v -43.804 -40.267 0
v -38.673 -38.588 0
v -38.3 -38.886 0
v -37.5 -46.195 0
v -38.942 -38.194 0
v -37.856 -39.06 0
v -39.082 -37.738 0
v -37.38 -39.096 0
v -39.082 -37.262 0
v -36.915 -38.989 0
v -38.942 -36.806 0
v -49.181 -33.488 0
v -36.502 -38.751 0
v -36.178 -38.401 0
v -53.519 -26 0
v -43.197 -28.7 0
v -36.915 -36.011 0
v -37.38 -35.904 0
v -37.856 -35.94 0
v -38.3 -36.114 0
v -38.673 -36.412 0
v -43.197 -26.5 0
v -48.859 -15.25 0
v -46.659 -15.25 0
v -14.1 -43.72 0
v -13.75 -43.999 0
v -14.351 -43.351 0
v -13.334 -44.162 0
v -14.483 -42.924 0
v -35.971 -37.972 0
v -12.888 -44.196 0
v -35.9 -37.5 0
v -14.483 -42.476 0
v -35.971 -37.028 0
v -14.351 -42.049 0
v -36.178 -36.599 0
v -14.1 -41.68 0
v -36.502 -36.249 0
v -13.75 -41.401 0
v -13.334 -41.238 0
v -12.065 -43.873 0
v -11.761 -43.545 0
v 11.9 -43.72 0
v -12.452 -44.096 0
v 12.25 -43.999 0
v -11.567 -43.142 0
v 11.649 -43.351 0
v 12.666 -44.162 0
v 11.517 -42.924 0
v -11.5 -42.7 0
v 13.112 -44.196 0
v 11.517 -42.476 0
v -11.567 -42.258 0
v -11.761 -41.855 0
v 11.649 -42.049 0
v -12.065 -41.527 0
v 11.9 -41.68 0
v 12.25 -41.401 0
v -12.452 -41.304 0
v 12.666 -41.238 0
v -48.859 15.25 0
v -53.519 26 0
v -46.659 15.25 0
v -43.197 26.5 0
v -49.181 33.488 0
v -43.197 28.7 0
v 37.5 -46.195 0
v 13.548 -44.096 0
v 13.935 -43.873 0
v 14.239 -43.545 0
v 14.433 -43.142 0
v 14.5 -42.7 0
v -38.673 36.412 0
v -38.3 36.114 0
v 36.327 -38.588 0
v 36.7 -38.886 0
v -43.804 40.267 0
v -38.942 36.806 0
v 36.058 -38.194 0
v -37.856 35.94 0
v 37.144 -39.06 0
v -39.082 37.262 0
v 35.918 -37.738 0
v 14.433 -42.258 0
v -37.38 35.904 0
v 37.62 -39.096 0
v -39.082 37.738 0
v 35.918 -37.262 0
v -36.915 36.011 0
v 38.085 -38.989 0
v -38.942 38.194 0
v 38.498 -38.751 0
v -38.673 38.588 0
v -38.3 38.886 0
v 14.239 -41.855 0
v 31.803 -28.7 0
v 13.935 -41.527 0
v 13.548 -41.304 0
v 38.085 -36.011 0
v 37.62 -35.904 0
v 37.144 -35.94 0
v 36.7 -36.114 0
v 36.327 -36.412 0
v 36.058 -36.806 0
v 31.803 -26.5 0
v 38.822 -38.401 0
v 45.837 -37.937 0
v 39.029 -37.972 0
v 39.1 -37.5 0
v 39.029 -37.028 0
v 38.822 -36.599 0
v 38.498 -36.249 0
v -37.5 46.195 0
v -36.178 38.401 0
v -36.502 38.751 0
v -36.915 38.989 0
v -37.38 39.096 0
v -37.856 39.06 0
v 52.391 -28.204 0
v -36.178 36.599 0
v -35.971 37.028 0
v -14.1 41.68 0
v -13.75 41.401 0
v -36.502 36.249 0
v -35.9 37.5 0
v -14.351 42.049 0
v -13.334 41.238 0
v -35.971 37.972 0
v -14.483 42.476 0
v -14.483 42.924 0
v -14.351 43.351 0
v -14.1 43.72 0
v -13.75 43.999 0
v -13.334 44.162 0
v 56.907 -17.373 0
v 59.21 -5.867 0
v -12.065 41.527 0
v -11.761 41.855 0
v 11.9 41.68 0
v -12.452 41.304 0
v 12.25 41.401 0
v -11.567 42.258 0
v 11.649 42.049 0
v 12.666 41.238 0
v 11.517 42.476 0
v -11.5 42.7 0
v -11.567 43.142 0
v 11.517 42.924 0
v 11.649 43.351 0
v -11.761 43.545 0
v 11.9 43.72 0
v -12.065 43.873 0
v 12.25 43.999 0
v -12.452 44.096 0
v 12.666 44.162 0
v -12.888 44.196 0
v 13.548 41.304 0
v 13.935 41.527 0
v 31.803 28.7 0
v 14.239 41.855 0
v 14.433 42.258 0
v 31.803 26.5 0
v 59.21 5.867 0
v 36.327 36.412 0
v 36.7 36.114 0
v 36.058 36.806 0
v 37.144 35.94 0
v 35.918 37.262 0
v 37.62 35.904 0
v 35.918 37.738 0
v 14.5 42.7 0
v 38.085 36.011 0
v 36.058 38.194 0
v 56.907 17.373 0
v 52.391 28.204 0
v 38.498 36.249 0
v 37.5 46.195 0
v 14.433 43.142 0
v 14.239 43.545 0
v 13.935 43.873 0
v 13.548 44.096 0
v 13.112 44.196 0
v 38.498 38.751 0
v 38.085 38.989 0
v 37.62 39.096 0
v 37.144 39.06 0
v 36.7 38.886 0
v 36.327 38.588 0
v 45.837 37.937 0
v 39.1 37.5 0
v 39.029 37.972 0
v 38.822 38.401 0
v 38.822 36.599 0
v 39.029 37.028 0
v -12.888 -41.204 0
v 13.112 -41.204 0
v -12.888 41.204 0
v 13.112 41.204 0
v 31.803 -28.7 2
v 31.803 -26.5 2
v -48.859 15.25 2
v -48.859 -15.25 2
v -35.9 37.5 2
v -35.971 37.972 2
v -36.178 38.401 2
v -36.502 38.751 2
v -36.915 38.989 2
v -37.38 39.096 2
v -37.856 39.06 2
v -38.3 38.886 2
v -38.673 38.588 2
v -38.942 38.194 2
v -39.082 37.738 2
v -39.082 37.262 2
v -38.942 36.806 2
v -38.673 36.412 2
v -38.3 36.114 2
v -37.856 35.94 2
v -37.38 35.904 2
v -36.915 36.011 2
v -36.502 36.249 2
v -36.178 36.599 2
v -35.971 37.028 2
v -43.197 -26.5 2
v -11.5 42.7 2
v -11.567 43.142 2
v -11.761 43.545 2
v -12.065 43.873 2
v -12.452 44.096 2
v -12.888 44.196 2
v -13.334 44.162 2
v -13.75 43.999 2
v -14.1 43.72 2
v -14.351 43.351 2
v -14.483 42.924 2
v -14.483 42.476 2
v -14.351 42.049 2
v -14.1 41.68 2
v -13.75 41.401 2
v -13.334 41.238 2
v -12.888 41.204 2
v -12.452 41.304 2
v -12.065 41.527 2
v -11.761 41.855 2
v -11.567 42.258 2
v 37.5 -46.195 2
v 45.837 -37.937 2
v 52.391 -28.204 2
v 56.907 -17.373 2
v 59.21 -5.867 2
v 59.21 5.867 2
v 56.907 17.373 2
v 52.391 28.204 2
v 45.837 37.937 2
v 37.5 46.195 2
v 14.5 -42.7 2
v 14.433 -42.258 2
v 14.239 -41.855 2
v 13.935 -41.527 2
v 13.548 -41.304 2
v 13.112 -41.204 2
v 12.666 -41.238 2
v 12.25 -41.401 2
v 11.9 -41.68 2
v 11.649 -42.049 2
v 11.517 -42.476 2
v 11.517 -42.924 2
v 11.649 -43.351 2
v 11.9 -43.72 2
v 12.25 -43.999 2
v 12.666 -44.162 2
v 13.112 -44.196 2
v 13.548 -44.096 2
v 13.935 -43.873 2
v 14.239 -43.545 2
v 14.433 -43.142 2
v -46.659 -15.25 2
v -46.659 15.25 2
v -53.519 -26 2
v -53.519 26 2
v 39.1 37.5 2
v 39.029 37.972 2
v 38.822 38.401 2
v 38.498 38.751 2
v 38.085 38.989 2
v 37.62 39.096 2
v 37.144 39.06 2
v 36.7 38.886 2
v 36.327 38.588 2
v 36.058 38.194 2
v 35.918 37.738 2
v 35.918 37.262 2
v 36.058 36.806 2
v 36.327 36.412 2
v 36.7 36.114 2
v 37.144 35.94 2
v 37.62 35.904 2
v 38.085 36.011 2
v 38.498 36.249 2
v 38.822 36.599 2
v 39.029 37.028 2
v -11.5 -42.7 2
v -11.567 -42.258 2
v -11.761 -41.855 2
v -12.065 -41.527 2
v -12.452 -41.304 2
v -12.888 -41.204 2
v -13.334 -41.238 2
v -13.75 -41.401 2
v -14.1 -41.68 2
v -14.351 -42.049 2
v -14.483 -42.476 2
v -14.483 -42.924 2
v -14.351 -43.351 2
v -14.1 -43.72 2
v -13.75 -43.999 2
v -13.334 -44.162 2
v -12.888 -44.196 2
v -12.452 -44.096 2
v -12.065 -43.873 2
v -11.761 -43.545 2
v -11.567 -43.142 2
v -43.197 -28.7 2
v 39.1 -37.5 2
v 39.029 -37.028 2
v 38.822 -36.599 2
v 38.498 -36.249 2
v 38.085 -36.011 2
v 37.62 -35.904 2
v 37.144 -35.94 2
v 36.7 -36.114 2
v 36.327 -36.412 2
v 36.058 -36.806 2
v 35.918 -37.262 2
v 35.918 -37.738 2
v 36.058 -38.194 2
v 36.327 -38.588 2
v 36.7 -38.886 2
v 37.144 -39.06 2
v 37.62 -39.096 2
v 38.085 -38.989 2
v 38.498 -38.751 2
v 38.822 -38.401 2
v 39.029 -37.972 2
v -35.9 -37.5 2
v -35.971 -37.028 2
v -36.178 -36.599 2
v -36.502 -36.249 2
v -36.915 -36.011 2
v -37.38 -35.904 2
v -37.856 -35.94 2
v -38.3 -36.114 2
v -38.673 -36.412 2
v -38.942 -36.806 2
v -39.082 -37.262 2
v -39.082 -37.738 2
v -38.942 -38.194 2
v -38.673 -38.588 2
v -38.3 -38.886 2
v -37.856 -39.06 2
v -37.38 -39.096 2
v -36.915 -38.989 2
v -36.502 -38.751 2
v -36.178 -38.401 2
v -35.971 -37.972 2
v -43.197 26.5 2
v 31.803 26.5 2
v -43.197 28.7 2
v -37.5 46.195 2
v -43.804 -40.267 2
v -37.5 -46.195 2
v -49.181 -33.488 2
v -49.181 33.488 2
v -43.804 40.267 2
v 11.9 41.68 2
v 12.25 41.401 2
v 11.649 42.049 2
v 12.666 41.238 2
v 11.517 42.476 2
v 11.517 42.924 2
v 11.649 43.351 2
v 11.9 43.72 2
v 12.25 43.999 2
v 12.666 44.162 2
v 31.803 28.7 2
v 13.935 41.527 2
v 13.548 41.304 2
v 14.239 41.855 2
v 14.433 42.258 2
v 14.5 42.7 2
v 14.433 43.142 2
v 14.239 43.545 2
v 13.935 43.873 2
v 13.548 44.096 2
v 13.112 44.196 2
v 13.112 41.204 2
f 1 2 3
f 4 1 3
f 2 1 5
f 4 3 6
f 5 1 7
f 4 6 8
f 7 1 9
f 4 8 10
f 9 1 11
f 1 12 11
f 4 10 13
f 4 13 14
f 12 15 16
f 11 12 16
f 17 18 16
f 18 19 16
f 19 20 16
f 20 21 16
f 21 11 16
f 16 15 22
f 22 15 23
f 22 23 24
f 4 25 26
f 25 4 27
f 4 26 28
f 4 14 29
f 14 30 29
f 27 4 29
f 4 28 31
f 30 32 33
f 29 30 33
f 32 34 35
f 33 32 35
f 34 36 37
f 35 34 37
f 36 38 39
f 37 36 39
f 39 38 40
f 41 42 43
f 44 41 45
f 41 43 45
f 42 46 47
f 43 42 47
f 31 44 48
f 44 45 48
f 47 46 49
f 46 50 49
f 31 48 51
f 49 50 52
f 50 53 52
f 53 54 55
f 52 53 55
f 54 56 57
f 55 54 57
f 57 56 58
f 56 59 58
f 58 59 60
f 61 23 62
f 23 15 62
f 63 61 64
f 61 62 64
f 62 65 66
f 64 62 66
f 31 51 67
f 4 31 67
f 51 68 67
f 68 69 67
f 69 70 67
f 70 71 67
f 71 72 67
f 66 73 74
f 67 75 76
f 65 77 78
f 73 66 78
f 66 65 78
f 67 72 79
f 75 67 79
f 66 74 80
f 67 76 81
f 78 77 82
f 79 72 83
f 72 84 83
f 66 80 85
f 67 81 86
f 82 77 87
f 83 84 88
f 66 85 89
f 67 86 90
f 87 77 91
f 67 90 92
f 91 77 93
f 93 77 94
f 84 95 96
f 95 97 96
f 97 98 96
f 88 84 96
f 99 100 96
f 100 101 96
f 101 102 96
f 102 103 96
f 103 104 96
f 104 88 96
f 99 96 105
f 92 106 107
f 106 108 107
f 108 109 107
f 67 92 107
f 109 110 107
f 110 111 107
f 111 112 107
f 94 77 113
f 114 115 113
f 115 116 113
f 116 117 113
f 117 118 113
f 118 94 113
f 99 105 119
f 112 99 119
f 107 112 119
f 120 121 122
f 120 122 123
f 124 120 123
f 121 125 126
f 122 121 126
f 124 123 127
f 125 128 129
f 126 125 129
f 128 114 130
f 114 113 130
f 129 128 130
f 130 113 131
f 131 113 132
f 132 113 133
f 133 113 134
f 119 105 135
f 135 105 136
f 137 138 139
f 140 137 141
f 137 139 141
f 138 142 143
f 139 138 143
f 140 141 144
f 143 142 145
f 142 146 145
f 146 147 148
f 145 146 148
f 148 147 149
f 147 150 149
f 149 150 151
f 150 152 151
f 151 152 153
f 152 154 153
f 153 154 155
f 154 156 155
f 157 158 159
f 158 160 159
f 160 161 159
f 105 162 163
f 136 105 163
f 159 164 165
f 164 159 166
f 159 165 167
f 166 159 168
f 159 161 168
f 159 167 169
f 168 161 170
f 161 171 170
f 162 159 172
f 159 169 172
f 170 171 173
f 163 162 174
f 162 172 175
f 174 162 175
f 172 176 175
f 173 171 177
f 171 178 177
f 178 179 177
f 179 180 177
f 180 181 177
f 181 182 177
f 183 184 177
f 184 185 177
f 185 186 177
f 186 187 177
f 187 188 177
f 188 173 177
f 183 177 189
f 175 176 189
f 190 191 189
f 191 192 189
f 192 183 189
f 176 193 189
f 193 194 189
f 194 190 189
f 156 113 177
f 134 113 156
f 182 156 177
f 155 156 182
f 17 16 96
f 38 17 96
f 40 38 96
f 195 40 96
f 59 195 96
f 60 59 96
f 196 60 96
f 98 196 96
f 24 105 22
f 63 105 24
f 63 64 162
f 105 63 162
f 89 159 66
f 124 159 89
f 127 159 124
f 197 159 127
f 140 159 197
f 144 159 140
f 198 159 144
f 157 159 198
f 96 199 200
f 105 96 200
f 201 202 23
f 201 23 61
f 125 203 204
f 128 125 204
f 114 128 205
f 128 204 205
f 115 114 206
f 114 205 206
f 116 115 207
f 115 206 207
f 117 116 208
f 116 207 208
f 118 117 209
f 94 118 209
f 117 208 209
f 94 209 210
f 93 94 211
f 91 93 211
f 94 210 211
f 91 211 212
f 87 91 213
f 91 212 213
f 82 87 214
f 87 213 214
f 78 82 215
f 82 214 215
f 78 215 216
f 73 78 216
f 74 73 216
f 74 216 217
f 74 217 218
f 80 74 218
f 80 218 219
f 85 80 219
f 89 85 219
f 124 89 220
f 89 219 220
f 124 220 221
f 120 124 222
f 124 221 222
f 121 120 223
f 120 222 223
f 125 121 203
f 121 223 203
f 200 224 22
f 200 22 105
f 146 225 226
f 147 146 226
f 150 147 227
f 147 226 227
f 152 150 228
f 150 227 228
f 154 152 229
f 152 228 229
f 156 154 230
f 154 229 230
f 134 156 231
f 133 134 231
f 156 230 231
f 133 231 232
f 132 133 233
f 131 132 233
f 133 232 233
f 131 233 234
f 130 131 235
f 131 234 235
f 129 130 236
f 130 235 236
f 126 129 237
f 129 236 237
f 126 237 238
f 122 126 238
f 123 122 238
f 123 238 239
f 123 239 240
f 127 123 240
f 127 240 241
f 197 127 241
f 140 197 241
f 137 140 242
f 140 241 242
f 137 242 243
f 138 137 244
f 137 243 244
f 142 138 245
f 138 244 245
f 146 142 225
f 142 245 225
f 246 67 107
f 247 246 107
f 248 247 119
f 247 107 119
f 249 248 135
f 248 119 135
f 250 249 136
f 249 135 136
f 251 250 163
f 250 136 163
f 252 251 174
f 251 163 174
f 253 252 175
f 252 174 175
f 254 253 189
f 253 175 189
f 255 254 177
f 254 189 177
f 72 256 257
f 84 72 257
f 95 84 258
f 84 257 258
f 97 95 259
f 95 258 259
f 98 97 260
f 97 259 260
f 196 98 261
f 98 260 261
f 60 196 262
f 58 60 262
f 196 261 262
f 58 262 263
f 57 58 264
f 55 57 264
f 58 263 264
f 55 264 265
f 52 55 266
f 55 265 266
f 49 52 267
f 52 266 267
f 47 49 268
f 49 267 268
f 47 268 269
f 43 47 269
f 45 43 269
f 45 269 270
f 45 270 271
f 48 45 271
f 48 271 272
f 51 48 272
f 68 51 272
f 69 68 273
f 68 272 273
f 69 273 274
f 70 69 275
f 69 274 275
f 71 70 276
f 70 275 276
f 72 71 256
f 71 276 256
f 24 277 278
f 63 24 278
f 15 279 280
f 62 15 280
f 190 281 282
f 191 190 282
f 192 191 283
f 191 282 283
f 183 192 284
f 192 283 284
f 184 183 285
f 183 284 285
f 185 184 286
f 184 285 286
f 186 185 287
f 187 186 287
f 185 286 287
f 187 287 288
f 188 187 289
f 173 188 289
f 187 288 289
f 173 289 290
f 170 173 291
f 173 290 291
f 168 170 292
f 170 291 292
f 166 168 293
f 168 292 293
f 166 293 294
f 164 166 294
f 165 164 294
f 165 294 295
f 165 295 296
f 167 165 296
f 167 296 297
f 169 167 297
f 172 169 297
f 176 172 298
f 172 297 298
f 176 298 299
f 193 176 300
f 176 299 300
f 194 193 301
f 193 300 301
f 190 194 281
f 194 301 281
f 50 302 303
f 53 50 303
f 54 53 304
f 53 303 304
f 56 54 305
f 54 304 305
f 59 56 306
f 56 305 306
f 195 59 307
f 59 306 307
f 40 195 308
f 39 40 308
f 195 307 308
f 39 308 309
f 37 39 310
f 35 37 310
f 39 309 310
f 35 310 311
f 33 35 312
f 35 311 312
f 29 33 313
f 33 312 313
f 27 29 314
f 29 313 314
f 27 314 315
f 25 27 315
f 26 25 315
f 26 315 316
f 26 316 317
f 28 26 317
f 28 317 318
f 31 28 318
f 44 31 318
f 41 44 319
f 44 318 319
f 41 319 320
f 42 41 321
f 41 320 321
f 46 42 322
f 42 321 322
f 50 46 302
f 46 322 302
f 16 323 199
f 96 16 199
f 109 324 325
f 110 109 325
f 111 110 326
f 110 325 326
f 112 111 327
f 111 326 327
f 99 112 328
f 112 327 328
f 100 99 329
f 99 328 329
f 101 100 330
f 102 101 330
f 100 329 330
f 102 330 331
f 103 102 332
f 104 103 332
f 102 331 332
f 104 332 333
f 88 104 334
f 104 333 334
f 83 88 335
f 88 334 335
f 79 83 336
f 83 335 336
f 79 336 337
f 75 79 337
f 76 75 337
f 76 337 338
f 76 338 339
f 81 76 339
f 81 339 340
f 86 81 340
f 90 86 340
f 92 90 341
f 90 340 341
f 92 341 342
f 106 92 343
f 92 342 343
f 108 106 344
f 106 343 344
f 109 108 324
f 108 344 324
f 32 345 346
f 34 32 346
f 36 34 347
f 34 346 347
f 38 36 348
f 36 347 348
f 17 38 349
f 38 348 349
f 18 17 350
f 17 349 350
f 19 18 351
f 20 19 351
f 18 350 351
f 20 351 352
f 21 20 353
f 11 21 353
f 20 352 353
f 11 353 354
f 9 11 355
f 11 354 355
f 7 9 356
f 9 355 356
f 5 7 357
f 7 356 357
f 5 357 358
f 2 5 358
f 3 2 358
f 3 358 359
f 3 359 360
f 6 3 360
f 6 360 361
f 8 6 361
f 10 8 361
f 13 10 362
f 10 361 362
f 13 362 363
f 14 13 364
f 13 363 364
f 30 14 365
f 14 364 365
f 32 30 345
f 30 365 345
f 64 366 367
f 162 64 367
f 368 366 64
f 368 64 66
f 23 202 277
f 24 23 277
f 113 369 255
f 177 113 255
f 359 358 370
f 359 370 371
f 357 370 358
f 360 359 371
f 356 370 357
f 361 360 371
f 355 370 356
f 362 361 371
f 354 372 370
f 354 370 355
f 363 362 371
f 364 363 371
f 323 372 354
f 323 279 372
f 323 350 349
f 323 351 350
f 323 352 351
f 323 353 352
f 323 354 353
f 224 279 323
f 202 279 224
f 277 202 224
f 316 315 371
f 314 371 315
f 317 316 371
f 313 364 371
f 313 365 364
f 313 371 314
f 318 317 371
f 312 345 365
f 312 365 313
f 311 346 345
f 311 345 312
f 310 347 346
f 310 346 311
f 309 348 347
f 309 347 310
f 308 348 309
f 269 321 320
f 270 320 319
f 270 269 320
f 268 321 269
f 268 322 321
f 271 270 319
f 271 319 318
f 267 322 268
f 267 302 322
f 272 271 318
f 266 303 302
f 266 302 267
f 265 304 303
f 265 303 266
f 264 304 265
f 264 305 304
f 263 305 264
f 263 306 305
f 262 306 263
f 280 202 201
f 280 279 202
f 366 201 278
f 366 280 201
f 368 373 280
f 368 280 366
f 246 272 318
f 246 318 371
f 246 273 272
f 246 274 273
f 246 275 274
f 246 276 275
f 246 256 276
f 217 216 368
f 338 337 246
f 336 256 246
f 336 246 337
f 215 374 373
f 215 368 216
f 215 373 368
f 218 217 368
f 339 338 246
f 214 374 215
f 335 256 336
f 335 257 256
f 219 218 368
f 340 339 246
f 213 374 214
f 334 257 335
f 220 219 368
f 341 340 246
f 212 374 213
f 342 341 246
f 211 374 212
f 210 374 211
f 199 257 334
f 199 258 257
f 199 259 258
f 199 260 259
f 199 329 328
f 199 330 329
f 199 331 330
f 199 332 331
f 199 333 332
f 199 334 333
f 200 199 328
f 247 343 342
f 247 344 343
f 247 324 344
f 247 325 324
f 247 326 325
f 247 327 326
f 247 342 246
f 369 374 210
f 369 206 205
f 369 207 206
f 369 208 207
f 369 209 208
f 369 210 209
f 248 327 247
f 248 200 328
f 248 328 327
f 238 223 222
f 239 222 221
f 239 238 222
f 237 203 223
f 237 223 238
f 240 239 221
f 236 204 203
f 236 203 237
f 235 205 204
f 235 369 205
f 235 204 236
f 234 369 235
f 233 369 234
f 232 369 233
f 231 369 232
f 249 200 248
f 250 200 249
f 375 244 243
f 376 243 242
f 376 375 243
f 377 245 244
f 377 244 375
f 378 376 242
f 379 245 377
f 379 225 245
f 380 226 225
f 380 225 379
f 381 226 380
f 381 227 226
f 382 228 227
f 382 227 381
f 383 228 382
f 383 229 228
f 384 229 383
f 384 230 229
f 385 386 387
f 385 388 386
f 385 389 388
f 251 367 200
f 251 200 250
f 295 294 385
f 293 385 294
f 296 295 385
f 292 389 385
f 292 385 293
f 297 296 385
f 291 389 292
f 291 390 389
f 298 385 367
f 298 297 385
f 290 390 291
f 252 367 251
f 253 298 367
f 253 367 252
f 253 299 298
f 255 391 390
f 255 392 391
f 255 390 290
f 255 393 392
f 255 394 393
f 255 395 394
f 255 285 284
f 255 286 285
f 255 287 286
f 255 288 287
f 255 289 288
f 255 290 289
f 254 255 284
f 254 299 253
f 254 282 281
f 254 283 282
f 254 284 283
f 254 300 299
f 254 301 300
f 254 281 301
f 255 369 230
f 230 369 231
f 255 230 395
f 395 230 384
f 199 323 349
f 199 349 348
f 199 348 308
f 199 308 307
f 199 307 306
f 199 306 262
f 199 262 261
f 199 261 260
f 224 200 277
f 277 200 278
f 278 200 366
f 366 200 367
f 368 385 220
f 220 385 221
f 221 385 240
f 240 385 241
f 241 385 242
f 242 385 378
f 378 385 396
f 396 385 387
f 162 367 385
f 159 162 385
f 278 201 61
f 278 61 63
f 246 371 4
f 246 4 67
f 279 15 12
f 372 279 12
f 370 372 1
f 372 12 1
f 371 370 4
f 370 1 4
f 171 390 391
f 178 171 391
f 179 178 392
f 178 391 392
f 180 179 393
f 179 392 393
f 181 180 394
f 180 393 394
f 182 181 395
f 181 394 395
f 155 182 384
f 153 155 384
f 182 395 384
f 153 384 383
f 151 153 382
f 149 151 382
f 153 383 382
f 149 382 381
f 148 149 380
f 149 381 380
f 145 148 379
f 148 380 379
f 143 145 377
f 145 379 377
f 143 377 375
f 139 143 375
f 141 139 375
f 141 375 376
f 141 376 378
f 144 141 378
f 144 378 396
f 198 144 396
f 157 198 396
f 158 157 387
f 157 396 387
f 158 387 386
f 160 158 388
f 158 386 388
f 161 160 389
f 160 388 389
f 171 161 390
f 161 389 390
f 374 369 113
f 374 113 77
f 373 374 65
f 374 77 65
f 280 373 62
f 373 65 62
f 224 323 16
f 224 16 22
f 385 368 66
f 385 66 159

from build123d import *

# Parameters (mm, degrees)
SKIZZE1_R                       = 59.5
AUFSATZ_LINEAR_AUSTRAGEN1_DEPTH = 2
SKIZZE2_R                       = 1.6
SKIZZE2_W                       = 75
SKIZZE2_H                       = 2.2
SKIZZE2_W_2                     = 2.2
SKIZZE2_H_2                     = 30.5
SCHNITT_LINEAR_AUSTRAGEN1_DEPTH = 2
SKIZZE3_R                       = 1.5
SKIZZE3_W                       = 75
SKIZZE3_H                       = 13.30476215
SKIZZE3_W_2                     = 5.981311675
SKIZZE3_H_2                     = 52
SCHNITT_LINEAR_AUSTRAGEN2_DEPTH = 2


with BuildPart() as part:
    # Skizze1 → Aufsatz-Linear austragen1 (new body)
    with BuildSketch(Plane.XY):
        Circle(SKIZZE1_R)
    extrude(amount=AUFSATZ_LINEAR_AUSTRAGEN1_DEPTH)

    # Skizze2 → Schnitt-Linear austragen1 (cut)
    with BuildSketch(Plane.XY.offset(2)):
        with Locations((37.5, -37.5)):
            Circle(SKIZZE2_R)
        with Locations((-37.5, -37.5)):
            Circle(SKIZZE2_R)
        with Locations((-37.5, 37.5)):
            Circle(SKIZZE2_R)
        with Locations((37.5, 37.5)):
            Circle(SKIZZE2_R)
        with Locations((-5.697175449, 27.6)):
            Rectangle(SKIZZE2_W, SKIZZE2_H)
        with Locations((-5.697175449, -27.6)):
            Rectangle(SKIZZE2_W, SKIZZE2_H)
        with Locations((-47.758902381, 0)):
            Rectangle(SKIZZE2_W_2, SKIZZE2_H_2)
    extrude(amount=-SCHNITT_LINEAR_AUSTRAGEN1_DEPTH, mode=Mode.SUBTRACT)

    # Skizze3 → Schnitt-Linear austragen2 (cut)
    with BuildSketch(Plane.XY.offset(2)):
        with Locations((-13, -42.7)):
            Circle(SKIZZE3_R)
        with Locations((13, -42.7)):
            Circle(SKIZZE3_R)
        with Locations((-13, 42.7)):
            Circle(SKIZZE3_R)
        with Locations((13, 42.7)):
            Circle(SKIZZE3_R)
        with Locations((0, 52.847618925)):
            Rectangle(SKIZZE3_W, SKIZZE3_H)
        with Locations((0, -52.847618925)):
            Rectangle(SKIZZE3_W, SKIZZE3_H)
        with Locations((-56.509344163, 0)):
            Rectangle(SKIZZE3_W_2, SKIZZE3_H_2)
    extrude(amount=-SCHNITT_LINEAR_AUSTRAGEN2_DEPTH, mode=Mode.SUBTRACT)


solid = part.part
